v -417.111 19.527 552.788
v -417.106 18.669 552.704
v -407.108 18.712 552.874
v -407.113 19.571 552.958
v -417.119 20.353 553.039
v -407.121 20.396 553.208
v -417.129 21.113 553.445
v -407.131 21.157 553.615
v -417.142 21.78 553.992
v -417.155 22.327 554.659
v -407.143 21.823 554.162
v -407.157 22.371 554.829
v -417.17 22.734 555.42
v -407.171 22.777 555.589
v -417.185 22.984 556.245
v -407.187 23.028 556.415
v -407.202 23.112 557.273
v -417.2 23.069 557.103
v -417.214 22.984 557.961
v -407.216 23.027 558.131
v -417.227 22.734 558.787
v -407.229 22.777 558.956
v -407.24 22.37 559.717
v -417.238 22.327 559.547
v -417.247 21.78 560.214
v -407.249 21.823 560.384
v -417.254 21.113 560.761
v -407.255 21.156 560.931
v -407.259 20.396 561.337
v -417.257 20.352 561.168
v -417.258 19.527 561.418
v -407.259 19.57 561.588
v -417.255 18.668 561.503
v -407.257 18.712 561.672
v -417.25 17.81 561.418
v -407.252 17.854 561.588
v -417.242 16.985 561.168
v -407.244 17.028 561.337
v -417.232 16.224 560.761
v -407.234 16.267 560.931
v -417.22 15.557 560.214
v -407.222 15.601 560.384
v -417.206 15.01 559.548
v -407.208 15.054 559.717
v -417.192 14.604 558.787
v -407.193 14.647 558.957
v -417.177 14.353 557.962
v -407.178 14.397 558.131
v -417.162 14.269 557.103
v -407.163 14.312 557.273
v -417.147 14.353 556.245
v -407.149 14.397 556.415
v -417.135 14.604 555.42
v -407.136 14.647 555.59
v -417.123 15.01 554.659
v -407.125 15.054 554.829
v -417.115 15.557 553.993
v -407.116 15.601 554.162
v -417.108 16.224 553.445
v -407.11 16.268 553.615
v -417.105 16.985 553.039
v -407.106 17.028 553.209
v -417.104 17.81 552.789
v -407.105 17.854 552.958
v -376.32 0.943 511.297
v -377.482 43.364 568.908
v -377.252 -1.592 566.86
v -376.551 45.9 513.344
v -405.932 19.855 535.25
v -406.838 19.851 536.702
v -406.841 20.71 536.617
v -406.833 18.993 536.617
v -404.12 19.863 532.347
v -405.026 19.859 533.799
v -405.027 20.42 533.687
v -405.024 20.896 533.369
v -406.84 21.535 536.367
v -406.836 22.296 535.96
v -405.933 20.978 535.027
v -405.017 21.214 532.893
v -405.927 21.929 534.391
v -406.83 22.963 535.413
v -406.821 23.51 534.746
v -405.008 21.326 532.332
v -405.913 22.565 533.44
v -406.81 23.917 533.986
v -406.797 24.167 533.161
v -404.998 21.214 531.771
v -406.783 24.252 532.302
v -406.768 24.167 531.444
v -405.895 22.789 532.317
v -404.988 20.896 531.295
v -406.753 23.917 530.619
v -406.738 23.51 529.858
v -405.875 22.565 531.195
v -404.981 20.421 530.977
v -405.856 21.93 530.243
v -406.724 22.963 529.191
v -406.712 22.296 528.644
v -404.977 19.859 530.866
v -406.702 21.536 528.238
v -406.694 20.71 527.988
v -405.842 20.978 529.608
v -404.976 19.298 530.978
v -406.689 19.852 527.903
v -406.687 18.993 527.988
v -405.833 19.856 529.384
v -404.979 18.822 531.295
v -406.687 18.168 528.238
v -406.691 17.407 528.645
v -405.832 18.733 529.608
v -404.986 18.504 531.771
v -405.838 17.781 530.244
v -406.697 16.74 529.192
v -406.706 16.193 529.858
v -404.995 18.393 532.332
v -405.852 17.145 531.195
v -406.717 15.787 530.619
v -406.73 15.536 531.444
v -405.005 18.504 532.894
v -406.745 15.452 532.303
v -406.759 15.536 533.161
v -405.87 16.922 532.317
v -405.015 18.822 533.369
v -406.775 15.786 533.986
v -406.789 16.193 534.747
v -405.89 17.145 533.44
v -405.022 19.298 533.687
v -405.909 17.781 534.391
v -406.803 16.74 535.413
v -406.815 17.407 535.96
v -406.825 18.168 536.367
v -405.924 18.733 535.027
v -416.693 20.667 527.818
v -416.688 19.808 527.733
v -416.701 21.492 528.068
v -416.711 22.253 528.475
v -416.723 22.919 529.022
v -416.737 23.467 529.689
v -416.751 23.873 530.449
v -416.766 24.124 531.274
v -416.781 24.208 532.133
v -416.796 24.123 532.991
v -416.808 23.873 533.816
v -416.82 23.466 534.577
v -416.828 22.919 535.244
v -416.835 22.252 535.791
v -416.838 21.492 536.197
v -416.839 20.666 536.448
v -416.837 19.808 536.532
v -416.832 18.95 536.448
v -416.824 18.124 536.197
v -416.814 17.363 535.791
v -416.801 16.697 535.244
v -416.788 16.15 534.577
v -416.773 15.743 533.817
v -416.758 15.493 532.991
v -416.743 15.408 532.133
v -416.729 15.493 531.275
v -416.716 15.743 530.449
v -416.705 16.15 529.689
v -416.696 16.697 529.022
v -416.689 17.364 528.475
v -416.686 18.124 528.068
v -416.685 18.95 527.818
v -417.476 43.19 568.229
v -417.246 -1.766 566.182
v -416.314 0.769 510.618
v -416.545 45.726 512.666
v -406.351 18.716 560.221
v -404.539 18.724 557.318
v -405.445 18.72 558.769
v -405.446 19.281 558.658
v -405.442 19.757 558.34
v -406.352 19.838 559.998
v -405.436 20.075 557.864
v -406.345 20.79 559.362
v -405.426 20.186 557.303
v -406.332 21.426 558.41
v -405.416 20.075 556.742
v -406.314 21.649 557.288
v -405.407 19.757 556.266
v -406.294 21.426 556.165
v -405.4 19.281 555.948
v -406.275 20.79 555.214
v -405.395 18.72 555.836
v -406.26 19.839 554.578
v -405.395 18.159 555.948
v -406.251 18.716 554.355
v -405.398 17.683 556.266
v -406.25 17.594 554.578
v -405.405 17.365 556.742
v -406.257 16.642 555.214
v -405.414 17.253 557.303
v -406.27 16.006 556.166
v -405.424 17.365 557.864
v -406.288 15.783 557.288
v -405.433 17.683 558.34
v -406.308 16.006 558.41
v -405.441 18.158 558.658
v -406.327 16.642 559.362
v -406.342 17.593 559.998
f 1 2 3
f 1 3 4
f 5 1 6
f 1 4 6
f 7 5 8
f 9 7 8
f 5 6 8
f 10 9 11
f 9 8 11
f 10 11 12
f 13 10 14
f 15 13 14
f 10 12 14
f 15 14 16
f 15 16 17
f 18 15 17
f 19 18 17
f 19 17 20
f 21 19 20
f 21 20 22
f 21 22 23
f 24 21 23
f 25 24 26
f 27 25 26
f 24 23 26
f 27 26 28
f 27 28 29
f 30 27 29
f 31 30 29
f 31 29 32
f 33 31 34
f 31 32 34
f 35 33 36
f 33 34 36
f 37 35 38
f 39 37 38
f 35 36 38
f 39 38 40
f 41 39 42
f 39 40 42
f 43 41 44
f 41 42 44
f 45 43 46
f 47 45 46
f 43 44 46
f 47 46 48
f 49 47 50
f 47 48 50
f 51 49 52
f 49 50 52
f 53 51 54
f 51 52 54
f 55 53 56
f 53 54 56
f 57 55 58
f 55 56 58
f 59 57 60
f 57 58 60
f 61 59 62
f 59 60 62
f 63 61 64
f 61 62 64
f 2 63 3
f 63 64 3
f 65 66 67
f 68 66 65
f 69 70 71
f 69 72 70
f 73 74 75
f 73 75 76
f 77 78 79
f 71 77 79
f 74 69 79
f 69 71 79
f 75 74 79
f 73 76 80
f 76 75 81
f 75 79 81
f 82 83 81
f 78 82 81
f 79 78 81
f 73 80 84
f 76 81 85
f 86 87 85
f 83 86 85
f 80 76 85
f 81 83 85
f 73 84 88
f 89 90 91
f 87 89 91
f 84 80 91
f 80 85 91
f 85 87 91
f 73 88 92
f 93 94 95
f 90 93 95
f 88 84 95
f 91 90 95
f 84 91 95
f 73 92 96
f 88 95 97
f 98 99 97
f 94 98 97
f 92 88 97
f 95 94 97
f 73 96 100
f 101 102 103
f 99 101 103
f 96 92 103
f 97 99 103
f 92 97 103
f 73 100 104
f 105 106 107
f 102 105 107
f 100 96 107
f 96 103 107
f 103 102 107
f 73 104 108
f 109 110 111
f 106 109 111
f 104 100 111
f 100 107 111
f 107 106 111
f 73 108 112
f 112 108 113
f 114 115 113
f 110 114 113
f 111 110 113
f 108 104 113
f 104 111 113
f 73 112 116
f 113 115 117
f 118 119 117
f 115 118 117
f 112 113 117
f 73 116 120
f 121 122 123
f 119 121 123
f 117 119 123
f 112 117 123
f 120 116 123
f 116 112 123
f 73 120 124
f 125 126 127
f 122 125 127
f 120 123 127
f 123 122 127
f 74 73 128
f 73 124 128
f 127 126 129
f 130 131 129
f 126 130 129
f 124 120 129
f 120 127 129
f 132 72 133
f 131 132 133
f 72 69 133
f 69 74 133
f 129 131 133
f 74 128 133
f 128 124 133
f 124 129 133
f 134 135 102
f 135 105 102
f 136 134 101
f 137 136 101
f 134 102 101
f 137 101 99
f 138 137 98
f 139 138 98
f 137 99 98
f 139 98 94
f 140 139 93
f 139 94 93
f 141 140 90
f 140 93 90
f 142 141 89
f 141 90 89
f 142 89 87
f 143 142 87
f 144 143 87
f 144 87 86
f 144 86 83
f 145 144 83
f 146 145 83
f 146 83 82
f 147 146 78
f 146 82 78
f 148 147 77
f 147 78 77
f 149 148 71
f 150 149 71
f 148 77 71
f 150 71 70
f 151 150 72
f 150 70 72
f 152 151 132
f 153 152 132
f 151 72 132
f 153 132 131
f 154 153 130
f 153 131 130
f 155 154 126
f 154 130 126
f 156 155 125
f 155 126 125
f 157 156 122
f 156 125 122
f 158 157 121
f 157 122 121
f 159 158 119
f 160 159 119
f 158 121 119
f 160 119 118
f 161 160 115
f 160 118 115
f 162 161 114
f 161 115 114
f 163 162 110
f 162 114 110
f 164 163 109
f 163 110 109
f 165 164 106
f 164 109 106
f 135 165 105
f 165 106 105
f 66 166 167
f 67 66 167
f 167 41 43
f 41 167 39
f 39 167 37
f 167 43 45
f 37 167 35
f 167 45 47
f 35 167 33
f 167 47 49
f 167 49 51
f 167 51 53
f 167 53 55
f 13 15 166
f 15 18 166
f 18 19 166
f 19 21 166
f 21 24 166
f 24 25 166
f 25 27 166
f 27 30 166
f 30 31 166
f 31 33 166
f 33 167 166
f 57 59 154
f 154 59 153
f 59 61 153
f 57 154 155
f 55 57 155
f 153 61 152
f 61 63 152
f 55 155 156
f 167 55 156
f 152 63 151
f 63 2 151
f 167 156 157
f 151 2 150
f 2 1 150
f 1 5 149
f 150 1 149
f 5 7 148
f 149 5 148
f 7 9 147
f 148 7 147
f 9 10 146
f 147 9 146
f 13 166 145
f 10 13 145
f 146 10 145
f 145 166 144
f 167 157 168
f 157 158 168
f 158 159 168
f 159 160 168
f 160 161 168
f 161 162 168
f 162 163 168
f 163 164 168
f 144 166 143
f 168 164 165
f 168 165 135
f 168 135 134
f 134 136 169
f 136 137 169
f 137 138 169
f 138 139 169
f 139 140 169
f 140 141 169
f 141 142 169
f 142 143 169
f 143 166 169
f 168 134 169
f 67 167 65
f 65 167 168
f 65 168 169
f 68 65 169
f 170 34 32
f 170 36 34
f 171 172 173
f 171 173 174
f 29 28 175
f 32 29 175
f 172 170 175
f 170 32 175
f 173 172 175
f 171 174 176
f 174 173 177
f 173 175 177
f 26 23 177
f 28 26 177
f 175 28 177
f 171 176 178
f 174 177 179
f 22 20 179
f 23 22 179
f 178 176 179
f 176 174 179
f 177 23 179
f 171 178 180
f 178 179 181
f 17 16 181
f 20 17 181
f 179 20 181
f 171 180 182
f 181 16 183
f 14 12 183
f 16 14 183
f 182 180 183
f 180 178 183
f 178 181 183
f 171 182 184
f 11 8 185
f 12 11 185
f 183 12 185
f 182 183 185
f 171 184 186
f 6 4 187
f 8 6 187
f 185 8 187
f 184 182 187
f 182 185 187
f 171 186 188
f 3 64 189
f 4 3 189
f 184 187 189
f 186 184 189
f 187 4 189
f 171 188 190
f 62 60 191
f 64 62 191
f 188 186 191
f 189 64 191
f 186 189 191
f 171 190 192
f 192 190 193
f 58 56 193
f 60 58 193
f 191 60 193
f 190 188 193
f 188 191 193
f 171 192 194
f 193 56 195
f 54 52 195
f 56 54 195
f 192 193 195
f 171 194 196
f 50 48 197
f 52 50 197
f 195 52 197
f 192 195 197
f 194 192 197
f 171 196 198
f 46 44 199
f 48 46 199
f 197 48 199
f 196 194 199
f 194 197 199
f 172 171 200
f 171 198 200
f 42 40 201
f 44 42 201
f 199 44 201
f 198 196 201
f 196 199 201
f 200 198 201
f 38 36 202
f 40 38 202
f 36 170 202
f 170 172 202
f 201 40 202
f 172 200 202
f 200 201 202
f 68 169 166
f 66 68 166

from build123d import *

# Parameters (mm, degrees)
BOSS_EXTRUDE1_DEPTH         = 40
M10X1_25_TAPPED_HOLE1_D     = 8.8
M10X1_25_TAPPED_HOLE1_DEPTH = 10
M10X1_25_TAPPED_HOLE1_TIP   = 2.643786724


with BuildPart() as part:
    # Sketch1 → Boss-Extrude1 (new body)
    with BuildSketch(Plane(origin=(-407.523949035, -1.773656994, -6.913182302), x_dir=(0.01696126662903347, 3.690723310511945e-05, -0.99985614668921), z_dir=(0.9998466777110684, 0.004351609412378134, 0.016961266629033474))):
        Polygon((-575.226758447, 44.985593464), (-573.177194833, 0.028597337), (-517.605829152, 2.562063958), (-519.655392766, 47.519060086), align=None)
    extrude(amount=BOSS_EXTRUDE1_DEPTH)

    # M10x1.25 Tapped Hole1
    with Locations(Plane(origin=(-407.523949035, -1.773656994, -6.913182302), x_dir=(-0.016961266629033415, -3.690723310511849e-05, 0.99985614668921), z_dir=(-0.9998466777110684, -0.004351609412377967, -0.016961266629033418))):
        with Locations((564.098413091, 20.463266947), (539.12435261, 21.601820011)):
            Hole(M10X1_25_TAPPED_HOLE1_D / 2, depth=M10X1_25_TAPPED_HOLE1_DEPTH)
            with Locations((0, 0, -(M10X1_25_TAPPED_HOLE1_DEPTH + M10X1_25_TAPPED_HOLE1_TIP / 2))):  # 118° drill point
                Cone(0, M10X1_25_TAPPED_HOLE1_D / 2, M10X1_25_TAPPED_HOLE1_TIP, mode=Mode.SUBTRACT)


solid = part.part
